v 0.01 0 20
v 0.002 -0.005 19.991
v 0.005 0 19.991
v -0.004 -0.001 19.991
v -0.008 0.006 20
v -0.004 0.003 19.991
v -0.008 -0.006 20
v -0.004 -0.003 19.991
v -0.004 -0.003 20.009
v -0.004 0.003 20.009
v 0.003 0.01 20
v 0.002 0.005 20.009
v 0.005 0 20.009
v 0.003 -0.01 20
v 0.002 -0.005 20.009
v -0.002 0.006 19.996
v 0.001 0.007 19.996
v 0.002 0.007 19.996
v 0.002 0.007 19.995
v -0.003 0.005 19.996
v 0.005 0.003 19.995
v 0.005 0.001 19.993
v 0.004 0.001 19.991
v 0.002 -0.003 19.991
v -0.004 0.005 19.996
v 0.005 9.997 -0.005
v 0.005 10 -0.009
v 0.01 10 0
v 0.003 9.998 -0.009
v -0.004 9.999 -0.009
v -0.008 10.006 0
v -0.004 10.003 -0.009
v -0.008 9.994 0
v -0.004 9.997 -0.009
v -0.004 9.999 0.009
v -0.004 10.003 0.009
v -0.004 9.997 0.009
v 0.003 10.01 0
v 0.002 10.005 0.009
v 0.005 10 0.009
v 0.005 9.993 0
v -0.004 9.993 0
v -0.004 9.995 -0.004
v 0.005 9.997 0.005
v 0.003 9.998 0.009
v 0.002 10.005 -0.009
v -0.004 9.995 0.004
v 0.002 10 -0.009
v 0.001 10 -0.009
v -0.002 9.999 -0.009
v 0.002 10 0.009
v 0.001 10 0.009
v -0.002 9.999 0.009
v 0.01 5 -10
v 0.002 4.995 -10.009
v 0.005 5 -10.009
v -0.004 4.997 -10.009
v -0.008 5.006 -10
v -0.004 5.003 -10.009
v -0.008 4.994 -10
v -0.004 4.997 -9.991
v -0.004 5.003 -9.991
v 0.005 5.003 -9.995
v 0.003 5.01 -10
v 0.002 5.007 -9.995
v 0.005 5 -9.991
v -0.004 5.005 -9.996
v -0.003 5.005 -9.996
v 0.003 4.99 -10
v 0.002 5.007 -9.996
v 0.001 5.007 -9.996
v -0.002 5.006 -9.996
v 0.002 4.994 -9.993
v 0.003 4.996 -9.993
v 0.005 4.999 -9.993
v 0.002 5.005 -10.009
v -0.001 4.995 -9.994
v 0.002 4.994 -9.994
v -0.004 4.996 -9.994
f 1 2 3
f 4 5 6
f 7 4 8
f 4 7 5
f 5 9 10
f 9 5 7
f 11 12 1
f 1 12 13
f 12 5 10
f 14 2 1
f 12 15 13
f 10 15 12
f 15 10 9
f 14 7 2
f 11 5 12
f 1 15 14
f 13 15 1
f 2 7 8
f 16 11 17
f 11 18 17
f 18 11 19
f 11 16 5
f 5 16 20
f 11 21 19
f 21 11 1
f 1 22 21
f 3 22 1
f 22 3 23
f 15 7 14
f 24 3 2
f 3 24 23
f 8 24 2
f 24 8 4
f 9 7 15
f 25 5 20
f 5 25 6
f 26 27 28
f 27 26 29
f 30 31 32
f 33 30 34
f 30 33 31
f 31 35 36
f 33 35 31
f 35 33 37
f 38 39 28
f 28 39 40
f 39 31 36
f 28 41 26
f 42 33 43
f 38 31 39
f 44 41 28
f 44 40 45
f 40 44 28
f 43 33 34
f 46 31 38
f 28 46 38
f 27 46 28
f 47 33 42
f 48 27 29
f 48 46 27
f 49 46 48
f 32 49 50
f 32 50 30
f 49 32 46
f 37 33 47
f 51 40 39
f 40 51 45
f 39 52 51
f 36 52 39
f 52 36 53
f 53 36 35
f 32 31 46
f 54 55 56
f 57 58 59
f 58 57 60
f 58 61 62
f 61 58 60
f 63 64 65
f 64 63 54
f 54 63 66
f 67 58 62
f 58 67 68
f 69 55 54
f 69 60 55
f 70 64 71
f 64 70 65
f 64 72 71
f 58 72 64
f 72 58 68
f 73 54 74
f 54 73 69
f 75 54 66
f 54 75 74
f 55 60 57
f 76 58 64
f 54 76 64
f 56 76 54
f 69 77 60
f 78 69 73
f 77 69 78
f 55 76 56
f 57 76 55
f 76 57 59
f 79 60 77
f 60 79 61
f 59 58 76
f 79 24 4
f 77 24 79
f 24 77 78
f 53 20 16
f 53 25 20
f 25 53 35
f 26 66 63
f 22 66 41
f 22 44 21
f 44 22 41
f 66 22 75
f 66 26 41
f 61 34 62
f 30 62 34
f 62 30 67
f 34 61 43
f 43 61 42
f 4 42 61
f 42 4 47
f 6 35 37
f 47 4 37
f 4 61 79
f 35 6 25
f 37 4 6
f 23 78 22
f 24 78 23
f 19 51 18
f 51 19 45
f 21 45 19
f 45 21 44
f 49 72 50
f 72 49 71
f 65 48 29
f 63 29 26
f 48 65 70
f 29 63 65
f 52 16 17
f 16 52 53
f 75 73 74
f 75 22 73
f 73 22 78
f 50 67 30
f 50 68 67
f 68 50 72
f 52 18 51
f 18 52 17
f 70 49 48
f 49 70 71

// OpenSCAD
$fn=5;
union()
{
	hull()
	{
		translate([0,0,20])
		{
			rotate(0,[0,0,1])
			{
				sphere(d=0.01);
			}
		}
		translate([0,10,0])
		{
			rotate(0,[0,0,1])
			{
				sphere(d=0.01);
			}
		}
		translate([0,5,-10])
		{
			rotate(0,[0,0,1])
			{
				sphere(d=0.01);
			}
		}
	}
	union()
	{
		translate([0,0,20])
		{
			rotate(0,[0,0,1])
			{
				sphere(d=0.02);
			}
		}
		translate([0,10,0])
		{
			rotate(0,[0,0,1])
			{
				sphere(d=0.02);
			}
		}
		translate([0,5,-10])
		{
			rotate(0,[0,0,1])
			{
				sphere(d=0.02);
			}
		}
	}
}
